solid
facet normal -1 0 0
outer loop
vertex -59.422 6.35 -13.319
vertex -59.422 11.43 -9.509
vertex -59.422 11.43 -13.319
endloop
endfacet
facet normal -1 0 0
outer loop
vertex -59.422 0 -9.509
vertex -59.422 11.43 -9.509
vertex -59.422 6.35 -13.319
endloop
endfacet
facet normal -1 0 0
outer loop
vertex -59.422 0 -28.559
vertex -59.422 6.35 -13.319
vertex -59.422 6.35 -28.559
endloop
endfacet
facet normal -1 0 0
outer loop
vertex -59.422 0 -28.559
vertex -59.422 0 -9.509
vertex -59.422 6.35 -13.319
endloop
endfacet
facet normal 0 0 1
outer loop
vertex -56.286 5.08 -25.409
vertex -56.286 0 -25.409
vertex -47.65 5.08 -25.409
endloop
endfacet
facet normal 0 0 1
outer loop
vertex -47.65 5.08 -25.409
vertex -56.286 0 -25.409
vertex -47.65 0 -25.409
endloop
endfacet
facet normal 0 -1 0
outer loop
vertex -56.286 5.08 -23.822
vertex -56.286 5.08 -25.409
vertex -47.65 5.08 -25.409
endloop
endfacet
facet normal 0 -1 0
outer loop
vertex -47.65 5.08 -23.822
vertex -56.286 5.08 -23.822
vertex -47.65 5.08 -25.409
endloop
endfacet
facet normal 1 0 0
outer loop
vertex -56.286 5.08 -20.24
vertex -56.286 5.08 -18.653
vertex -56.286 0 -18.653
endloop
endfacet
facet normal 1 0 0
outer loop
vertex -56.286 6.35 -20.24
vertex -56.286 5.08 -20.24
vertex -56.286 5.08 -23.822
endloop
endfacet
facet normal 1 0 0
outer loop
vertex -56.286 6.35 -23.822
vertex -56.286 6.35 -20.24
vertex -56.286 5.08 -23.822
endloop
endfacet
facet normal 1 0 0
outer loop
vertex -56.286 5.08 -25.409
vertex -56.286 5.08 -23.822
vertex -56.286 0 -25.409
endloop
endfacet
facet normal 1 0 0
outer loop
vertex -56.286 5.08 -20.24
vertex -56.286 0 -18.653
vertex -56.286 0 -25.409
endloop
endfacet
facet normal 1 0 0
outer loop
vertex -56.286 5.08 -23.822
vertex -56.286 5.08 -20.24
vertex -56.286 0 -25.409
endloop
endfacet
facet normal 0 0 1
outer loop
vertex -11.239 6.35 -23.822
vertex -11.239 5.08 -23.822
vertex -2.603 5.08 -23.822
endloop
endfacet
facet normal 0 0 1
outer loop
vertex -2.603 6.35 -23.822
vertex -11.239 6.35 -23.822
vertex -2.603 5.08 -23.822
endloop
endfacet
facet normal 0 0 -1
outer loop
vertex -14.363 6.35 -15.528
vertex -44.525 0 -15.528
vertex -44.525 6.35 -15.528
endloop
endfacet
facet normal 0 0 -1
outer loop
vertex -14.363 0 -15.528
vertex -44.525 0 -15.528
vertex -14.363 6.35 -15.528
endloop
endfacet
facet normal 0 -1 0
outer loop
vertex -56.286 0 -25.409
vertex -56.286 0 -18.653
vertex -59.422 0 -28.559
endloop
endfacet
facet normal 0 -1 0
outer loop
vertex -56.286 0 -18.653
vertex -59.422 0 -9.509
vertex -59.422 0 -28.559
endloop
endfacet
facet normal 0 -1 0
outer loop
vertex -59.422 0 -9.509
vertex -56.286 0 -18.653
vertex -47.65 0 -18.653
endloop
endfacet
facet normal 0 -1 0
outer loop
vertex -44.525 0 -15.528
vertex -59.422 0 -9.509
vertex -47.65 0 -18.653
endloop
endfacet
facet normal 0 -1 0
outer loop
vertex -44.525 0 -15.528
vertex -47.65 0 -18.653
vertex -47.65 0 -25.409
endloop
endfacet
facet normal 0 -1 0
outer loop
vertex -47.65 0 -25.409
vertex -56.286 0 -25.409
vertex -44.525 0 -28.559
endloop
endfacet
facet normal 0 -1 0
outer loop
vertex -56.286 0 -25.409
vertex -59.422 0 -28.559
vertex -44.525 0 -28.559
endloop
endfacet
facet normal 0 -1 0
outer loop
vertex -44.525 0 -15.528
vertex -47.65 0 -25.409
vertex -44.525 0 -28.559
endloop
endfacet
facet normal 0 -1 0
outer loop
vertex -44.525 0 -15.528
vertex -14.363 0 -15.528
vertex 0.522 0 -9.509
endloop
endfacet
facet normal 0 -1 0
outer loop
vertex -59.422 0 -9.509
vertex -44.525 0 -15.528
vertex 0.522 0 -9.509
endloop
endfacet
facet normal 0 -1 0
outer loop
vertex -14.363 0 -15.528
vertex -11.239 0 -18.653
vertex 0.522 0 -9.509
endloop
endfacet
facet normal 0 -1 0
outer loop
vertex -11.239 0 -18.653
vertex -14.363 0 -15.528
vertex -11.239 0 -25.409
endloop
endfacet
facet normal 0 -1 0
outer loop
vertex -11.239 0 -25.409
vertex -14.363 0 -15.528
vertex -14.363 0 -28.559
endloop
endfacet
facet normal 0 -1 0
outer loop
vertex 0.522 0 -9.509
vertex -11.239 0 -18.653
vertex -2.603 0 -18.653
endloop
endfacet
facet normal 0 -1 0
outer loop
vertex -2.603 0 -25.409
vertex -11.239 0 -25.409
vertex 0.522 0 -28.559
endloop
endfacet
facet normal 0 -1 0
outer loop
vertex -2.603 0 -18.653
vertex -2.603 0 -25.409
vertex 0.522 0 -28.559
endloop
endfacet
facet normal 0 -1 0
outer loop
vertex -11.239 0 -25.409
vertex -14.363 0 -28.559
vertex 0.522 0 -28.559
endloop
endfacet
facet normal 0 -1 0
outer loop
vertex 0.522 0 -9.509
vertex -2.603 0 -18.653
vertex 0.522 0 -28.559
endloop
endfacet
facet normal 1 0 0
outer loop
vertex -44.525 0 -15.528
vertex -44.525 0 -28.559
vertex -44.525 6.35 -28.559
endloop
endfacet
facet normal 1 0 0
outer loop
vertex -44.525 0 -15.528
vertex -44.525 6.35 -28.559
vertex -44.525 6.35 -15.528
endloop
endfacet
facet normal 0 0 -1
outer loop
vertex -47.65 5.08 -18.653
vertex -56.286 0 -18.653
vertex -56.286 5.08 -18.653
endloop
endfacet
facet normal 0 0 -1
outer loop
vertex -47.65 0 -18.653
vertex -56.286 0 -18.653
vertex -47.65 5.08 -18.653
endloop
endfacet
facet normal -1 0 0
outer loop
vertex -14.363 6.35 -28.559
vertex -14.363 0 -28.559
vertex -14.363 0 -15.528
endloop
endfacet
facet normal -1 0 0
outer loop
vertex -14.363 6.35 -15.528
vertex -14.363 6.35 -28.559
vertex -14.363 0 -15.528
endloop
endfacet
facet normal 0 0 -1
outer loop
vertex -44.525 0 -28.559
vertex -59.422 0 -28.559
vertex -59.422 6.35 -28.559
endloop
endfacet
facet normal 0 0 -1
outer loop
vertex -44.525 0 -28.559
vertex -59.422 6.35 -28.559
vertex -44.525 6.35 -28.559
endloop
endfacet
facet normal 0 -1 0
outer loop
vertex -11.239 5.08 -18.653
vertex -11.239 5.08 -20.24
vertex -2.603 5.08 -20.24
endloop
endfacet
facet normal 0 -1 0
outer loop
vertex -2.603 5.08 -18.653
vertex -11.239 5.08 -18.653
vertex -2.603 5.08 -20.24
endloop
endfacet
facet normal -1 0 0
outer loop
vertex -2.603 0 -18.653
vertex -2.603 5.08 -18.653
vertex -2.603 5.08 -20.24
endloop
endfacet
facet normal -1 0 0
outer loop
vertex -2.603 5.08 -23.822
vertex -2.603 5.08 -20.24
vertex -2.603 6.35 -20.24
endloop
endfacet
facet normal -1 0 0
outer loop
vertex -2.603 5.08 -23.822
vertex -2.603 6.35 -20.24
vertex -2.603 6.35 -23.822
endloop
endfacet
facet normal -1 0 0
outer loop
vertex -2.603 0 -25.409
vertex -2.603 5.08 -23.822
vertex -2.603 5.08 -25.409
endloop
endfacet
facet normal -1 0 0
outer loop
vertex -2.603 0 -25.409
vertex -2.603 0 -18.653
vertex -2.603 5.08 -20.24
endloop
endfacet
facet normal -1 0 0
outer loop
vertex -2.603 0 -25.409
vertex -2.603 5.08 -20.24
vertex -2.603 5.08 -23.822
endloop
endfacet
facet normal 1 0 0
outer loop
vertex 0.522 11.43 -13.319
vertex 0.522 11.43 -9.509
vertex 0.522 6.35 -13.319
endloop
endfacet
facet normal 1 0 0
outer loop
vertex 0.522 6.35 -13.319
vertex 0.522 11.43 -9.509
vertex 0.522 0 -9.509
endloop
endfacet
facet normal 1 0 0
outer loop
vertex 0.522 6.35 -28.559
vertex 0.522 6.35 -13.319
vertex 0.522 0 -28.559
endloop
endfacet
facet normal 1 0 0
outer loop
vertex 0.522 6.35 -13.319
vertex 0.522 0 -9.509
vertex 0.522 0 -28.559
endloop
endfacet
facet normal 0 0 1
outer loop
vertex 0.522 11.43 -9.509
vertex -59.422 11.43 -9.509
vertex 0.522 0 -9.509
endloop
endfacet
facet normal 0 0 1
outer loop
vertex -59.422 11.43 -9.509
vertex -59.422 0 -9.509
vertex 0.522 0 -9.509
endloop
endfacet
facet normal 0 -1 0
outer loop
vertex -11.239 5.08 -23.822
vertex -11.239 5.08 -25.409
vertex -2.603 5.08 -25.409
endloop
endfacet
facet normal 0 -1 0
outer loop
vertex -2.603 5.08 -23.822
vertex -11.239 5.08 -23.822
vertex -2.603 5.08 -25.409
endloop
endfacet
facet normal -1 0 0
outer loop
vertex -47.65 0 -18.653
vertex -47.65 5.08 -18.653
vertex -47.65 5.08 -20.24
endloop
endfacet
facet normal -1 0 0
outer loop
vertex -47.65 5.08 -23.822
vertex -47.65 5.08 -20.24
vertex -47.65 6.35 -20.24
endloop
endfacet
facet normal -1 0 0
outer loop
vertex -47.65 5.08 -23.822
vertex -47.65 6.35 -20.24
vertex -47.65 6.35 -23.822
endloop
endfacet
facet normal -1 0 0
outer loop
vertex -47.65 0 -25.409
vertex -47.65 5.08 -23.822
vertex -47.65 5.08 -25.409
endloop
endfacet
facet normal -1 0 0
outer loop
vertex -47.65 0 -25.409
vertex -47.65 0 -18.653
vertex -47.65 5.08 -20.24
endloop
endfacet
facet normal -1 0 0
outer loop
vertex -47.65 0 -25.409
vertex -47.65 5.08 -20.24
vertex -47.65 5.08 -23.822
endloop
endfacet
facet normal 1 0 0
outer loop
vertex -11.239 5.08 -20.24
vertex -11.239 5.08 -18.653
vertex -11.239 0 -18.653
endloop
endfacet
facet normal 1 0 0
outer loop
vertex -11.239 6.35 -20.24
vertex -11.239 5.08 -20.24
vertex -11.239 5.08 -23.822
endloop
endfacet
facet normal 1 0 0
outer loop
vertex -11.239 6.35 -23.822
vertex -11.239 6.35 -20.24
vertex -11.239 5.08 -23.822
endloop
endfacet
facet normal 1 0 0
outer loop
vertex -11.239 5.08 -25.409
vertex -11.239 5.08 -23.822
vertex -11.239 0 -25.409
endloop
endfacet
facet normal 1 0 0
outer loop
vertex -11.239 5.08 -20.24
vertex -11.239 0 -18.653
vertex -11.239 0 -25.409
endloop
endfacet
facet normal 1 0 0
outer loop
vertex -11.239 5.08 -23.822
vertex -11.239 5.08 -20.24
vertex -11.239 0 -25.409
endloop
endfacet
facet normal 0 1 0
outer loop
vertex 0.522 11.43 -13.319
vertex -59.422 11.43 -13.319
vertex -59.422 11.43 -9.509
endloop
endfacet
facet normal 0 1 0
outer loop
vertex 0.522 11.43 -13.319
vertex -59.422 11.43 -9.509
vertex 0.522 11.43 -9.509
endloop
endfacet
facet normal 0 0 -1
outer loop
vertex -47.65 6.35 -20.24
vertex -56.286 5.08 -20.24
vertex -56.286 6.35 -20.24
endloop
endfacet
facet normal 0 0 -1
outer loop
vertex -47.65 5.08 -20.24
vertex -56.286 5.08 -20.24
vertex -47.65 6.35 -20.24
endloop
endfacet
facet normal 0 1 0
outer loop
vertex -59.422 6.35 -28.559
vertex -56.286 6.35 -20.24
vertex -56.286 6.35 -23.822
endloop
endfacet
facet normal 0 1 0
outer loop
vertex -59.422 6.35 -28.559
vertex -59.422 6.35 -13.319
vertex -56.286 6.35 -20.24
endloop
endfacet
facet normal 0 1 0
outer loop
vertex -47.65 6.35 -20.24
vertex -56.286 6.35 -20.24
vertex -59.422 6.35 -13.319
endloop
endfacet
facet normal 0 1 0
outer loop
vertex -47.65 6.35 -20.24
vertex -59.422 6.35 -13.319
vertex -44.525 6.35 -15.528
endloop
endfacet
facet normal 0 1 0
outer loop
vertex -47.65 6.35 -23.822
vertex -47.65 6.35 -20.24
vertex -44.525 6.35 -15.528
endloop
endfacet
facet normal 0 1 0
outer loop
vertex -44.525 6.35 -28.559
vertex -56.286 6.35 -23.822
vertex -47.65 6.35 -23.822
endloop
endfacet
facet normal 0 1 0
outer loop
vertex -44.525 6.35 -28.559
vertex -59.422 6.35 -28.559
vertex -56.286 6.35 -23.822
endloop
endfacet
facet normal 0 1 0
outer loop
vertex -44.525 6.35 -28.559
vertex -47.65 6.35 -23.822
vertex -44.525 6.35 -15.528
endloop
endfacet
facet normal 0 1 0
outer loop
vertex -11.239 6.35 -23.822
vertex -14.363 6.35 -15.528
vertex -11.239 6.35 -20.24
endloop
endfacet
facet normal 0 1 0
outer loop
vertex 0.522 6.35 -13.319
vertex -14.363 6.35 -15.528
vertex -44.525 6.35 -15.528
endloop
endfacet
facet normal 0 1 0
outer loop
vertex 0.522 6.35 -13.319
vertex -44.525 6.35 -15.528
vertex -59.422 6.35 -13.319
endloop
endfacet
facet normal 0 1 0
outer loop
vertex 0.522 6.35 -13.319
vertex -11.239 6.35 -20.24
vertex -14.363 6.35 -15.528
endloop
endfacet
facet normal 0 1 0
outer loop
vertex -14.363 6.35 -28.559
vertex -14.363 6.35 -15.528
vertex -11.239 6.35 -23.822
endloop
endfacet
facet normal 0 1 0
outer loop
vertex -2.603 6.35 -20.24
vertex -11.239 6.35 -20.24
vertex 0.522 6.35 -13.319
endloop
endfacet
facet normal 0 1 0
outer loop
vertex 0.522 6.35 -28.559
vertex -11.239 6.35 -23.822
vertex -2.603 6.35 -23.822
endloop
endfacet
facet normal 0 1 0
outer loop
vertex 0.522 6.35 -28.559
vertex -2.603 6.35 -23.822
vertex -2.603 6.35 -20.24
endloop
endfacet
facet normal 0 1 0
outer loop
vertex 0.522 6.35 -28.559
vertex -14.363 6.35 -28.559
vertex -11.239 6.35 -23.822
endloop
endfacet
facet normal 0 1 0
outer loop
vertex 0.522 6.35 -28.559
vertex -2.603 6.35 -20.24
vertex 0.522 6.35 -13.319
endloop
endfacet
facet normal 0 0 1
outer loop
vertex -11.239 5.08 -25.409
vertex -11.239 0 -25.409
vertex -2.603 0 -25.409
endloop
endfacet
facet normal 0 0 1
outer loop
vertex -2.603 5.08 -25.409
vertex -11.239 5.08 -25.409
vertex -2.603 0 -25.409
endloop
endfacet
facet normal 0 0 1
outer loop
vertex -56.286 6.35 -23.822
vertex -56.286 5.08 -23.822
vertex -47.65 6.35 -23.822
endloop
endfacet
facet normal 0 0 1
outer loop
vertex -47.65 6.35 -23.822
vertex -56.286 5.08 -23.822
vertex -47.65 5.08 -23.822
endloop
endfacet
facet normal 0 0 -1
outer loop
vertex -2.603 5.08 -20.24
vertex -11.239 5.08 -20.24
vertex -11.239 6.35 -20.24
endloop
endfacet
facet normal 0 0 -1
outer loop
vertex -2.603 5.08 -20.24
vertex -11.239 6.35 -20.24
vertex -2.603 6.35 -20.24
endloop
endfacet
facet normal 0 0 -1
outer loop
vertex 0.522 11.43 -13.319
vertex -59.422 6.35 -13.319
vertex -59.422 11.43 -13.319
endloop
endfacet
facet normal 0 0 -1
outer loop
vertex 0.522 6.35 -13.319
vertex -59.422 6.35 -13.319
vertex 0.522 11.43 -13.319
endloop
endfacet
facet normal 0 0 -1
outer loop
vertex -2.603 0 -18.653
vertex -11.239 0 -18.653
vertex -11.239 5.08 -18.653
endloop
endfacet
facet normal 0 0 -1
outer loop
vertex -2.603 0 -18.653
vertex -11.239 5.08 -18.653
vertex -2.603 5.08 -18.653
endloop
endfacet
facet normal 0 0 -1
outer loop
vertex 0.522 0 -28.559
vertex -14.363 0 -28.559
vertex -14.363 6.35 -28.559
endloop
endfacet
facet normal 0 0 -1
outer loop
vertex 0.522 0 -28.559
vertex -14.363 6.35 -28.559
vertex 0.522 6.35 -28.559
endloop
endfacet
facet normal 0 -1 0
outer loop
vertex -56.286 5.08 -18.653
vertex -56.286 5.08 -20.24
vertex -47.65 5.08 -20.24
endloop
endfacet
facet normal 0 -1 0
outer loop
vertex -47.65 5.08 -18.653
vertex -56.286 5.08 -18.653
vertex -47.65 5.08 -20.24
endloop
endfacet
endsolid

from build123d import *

# Parameters (mm, degrees)
SKETCH1_W           = 59.944
SKETCH1_H           = 19.05
SKETCH1_W_2         = 8.636
SKETCH1_H_2         = 6.7564
BOSS_EXTRUDE1_DEPTH = 5.08
SKETCH2_W           = 59.944
SKETCH2_H           = 19.05
SKETCH2_W_2         = 8.636
SKETCH2_H_2         = 3.5814
BOSS_EXTRUDE2_DEPTH = 1.27
SKETCH5_W           = 30.1625
SKETCH5_H           = 13.0302
CUT_EXTRUDE1_DEPTH  = 30.48
SKETCH6_W           = 59.944
SKETCH6_H           = 3.81
BOSS_EXTRUDE4_DEPTH = 5.08


with BuildPart() as part:
    # Sketch1 → Boss-Extrude1 (new body)
    with BuildSketch(Plane(origin=(0, 0, 0), x_dir=(1, 0, 0), z_dir=(0, 1, 0))):
        with Locations((-29.450443736, 19.033631364)):
            Rectangle(SKETCH1_W, SKETCH1_H)
        with Locations((-51.967543736, 22.030831364)):
            Rectangle(SKETCH1_W_2, SKETCH1_H_2, mode=Mode.SUBTRACT)
        with Locations((-6.920643736, 22.030831364)):
            Rectangle(SKETCH1_W_2, SKETCH1_H_2, mode=Mode.SUBTRACT)
    extrude(amount=BOSS_EXTRUDE1_DEPTH)

    # Sketch2 → Boss-Extrude2 (add)
    with BuildSketch(Plane(origin=(0, 5.08, 0), x_dir=(1, 0, 0), z_dir=(0, 1, 0))):
        with Locations((-29.450443736, 19.033631364)):
            Rectangle(SKETCH2_W, SKETCH2_H)
        with Locations((-51.967543736, 22.030831364)):
            Rectangle(SKETCH2_W_2, SKETCH2_H_2, mode=Mode.SUBTRACT)
        with Locations((-6.920643736, 22.030831364)):
            Rectangle(SKETCH2_W_2, SKETCH2_H_2, mode=Mode.SUBTRACT)
    extrude(amount=BOSS_EXTRUDE2_DEPTH)

    # Sketch5 → Cut-Extrude1 (cut)
    with BuildSketch(Plane.XZ):
        with Locations((-29.444093736, -22.043531364)):
            Rectangle(SKETCH5_W, SKETCH5_H)
    extrude(amount=-CUT_EXTRUDE1_DEPTH, mode=Mode.SUBTRACT)

    # Sketch6 → Boss-Extrude4 (add)
    with BuildSketch(Plane(origin=(0, 6.35, 0), x_dir=(1, 0, 0), z_dir=(0, 1, 0))):
        with Locations((-29.450443736, 11.413631364)):
            Rectangle(SKETCH6_W, SKETCH6_H)
    extrude(amount=BOSS_EXTRUDE4_DEPTH)


solid = part.part
